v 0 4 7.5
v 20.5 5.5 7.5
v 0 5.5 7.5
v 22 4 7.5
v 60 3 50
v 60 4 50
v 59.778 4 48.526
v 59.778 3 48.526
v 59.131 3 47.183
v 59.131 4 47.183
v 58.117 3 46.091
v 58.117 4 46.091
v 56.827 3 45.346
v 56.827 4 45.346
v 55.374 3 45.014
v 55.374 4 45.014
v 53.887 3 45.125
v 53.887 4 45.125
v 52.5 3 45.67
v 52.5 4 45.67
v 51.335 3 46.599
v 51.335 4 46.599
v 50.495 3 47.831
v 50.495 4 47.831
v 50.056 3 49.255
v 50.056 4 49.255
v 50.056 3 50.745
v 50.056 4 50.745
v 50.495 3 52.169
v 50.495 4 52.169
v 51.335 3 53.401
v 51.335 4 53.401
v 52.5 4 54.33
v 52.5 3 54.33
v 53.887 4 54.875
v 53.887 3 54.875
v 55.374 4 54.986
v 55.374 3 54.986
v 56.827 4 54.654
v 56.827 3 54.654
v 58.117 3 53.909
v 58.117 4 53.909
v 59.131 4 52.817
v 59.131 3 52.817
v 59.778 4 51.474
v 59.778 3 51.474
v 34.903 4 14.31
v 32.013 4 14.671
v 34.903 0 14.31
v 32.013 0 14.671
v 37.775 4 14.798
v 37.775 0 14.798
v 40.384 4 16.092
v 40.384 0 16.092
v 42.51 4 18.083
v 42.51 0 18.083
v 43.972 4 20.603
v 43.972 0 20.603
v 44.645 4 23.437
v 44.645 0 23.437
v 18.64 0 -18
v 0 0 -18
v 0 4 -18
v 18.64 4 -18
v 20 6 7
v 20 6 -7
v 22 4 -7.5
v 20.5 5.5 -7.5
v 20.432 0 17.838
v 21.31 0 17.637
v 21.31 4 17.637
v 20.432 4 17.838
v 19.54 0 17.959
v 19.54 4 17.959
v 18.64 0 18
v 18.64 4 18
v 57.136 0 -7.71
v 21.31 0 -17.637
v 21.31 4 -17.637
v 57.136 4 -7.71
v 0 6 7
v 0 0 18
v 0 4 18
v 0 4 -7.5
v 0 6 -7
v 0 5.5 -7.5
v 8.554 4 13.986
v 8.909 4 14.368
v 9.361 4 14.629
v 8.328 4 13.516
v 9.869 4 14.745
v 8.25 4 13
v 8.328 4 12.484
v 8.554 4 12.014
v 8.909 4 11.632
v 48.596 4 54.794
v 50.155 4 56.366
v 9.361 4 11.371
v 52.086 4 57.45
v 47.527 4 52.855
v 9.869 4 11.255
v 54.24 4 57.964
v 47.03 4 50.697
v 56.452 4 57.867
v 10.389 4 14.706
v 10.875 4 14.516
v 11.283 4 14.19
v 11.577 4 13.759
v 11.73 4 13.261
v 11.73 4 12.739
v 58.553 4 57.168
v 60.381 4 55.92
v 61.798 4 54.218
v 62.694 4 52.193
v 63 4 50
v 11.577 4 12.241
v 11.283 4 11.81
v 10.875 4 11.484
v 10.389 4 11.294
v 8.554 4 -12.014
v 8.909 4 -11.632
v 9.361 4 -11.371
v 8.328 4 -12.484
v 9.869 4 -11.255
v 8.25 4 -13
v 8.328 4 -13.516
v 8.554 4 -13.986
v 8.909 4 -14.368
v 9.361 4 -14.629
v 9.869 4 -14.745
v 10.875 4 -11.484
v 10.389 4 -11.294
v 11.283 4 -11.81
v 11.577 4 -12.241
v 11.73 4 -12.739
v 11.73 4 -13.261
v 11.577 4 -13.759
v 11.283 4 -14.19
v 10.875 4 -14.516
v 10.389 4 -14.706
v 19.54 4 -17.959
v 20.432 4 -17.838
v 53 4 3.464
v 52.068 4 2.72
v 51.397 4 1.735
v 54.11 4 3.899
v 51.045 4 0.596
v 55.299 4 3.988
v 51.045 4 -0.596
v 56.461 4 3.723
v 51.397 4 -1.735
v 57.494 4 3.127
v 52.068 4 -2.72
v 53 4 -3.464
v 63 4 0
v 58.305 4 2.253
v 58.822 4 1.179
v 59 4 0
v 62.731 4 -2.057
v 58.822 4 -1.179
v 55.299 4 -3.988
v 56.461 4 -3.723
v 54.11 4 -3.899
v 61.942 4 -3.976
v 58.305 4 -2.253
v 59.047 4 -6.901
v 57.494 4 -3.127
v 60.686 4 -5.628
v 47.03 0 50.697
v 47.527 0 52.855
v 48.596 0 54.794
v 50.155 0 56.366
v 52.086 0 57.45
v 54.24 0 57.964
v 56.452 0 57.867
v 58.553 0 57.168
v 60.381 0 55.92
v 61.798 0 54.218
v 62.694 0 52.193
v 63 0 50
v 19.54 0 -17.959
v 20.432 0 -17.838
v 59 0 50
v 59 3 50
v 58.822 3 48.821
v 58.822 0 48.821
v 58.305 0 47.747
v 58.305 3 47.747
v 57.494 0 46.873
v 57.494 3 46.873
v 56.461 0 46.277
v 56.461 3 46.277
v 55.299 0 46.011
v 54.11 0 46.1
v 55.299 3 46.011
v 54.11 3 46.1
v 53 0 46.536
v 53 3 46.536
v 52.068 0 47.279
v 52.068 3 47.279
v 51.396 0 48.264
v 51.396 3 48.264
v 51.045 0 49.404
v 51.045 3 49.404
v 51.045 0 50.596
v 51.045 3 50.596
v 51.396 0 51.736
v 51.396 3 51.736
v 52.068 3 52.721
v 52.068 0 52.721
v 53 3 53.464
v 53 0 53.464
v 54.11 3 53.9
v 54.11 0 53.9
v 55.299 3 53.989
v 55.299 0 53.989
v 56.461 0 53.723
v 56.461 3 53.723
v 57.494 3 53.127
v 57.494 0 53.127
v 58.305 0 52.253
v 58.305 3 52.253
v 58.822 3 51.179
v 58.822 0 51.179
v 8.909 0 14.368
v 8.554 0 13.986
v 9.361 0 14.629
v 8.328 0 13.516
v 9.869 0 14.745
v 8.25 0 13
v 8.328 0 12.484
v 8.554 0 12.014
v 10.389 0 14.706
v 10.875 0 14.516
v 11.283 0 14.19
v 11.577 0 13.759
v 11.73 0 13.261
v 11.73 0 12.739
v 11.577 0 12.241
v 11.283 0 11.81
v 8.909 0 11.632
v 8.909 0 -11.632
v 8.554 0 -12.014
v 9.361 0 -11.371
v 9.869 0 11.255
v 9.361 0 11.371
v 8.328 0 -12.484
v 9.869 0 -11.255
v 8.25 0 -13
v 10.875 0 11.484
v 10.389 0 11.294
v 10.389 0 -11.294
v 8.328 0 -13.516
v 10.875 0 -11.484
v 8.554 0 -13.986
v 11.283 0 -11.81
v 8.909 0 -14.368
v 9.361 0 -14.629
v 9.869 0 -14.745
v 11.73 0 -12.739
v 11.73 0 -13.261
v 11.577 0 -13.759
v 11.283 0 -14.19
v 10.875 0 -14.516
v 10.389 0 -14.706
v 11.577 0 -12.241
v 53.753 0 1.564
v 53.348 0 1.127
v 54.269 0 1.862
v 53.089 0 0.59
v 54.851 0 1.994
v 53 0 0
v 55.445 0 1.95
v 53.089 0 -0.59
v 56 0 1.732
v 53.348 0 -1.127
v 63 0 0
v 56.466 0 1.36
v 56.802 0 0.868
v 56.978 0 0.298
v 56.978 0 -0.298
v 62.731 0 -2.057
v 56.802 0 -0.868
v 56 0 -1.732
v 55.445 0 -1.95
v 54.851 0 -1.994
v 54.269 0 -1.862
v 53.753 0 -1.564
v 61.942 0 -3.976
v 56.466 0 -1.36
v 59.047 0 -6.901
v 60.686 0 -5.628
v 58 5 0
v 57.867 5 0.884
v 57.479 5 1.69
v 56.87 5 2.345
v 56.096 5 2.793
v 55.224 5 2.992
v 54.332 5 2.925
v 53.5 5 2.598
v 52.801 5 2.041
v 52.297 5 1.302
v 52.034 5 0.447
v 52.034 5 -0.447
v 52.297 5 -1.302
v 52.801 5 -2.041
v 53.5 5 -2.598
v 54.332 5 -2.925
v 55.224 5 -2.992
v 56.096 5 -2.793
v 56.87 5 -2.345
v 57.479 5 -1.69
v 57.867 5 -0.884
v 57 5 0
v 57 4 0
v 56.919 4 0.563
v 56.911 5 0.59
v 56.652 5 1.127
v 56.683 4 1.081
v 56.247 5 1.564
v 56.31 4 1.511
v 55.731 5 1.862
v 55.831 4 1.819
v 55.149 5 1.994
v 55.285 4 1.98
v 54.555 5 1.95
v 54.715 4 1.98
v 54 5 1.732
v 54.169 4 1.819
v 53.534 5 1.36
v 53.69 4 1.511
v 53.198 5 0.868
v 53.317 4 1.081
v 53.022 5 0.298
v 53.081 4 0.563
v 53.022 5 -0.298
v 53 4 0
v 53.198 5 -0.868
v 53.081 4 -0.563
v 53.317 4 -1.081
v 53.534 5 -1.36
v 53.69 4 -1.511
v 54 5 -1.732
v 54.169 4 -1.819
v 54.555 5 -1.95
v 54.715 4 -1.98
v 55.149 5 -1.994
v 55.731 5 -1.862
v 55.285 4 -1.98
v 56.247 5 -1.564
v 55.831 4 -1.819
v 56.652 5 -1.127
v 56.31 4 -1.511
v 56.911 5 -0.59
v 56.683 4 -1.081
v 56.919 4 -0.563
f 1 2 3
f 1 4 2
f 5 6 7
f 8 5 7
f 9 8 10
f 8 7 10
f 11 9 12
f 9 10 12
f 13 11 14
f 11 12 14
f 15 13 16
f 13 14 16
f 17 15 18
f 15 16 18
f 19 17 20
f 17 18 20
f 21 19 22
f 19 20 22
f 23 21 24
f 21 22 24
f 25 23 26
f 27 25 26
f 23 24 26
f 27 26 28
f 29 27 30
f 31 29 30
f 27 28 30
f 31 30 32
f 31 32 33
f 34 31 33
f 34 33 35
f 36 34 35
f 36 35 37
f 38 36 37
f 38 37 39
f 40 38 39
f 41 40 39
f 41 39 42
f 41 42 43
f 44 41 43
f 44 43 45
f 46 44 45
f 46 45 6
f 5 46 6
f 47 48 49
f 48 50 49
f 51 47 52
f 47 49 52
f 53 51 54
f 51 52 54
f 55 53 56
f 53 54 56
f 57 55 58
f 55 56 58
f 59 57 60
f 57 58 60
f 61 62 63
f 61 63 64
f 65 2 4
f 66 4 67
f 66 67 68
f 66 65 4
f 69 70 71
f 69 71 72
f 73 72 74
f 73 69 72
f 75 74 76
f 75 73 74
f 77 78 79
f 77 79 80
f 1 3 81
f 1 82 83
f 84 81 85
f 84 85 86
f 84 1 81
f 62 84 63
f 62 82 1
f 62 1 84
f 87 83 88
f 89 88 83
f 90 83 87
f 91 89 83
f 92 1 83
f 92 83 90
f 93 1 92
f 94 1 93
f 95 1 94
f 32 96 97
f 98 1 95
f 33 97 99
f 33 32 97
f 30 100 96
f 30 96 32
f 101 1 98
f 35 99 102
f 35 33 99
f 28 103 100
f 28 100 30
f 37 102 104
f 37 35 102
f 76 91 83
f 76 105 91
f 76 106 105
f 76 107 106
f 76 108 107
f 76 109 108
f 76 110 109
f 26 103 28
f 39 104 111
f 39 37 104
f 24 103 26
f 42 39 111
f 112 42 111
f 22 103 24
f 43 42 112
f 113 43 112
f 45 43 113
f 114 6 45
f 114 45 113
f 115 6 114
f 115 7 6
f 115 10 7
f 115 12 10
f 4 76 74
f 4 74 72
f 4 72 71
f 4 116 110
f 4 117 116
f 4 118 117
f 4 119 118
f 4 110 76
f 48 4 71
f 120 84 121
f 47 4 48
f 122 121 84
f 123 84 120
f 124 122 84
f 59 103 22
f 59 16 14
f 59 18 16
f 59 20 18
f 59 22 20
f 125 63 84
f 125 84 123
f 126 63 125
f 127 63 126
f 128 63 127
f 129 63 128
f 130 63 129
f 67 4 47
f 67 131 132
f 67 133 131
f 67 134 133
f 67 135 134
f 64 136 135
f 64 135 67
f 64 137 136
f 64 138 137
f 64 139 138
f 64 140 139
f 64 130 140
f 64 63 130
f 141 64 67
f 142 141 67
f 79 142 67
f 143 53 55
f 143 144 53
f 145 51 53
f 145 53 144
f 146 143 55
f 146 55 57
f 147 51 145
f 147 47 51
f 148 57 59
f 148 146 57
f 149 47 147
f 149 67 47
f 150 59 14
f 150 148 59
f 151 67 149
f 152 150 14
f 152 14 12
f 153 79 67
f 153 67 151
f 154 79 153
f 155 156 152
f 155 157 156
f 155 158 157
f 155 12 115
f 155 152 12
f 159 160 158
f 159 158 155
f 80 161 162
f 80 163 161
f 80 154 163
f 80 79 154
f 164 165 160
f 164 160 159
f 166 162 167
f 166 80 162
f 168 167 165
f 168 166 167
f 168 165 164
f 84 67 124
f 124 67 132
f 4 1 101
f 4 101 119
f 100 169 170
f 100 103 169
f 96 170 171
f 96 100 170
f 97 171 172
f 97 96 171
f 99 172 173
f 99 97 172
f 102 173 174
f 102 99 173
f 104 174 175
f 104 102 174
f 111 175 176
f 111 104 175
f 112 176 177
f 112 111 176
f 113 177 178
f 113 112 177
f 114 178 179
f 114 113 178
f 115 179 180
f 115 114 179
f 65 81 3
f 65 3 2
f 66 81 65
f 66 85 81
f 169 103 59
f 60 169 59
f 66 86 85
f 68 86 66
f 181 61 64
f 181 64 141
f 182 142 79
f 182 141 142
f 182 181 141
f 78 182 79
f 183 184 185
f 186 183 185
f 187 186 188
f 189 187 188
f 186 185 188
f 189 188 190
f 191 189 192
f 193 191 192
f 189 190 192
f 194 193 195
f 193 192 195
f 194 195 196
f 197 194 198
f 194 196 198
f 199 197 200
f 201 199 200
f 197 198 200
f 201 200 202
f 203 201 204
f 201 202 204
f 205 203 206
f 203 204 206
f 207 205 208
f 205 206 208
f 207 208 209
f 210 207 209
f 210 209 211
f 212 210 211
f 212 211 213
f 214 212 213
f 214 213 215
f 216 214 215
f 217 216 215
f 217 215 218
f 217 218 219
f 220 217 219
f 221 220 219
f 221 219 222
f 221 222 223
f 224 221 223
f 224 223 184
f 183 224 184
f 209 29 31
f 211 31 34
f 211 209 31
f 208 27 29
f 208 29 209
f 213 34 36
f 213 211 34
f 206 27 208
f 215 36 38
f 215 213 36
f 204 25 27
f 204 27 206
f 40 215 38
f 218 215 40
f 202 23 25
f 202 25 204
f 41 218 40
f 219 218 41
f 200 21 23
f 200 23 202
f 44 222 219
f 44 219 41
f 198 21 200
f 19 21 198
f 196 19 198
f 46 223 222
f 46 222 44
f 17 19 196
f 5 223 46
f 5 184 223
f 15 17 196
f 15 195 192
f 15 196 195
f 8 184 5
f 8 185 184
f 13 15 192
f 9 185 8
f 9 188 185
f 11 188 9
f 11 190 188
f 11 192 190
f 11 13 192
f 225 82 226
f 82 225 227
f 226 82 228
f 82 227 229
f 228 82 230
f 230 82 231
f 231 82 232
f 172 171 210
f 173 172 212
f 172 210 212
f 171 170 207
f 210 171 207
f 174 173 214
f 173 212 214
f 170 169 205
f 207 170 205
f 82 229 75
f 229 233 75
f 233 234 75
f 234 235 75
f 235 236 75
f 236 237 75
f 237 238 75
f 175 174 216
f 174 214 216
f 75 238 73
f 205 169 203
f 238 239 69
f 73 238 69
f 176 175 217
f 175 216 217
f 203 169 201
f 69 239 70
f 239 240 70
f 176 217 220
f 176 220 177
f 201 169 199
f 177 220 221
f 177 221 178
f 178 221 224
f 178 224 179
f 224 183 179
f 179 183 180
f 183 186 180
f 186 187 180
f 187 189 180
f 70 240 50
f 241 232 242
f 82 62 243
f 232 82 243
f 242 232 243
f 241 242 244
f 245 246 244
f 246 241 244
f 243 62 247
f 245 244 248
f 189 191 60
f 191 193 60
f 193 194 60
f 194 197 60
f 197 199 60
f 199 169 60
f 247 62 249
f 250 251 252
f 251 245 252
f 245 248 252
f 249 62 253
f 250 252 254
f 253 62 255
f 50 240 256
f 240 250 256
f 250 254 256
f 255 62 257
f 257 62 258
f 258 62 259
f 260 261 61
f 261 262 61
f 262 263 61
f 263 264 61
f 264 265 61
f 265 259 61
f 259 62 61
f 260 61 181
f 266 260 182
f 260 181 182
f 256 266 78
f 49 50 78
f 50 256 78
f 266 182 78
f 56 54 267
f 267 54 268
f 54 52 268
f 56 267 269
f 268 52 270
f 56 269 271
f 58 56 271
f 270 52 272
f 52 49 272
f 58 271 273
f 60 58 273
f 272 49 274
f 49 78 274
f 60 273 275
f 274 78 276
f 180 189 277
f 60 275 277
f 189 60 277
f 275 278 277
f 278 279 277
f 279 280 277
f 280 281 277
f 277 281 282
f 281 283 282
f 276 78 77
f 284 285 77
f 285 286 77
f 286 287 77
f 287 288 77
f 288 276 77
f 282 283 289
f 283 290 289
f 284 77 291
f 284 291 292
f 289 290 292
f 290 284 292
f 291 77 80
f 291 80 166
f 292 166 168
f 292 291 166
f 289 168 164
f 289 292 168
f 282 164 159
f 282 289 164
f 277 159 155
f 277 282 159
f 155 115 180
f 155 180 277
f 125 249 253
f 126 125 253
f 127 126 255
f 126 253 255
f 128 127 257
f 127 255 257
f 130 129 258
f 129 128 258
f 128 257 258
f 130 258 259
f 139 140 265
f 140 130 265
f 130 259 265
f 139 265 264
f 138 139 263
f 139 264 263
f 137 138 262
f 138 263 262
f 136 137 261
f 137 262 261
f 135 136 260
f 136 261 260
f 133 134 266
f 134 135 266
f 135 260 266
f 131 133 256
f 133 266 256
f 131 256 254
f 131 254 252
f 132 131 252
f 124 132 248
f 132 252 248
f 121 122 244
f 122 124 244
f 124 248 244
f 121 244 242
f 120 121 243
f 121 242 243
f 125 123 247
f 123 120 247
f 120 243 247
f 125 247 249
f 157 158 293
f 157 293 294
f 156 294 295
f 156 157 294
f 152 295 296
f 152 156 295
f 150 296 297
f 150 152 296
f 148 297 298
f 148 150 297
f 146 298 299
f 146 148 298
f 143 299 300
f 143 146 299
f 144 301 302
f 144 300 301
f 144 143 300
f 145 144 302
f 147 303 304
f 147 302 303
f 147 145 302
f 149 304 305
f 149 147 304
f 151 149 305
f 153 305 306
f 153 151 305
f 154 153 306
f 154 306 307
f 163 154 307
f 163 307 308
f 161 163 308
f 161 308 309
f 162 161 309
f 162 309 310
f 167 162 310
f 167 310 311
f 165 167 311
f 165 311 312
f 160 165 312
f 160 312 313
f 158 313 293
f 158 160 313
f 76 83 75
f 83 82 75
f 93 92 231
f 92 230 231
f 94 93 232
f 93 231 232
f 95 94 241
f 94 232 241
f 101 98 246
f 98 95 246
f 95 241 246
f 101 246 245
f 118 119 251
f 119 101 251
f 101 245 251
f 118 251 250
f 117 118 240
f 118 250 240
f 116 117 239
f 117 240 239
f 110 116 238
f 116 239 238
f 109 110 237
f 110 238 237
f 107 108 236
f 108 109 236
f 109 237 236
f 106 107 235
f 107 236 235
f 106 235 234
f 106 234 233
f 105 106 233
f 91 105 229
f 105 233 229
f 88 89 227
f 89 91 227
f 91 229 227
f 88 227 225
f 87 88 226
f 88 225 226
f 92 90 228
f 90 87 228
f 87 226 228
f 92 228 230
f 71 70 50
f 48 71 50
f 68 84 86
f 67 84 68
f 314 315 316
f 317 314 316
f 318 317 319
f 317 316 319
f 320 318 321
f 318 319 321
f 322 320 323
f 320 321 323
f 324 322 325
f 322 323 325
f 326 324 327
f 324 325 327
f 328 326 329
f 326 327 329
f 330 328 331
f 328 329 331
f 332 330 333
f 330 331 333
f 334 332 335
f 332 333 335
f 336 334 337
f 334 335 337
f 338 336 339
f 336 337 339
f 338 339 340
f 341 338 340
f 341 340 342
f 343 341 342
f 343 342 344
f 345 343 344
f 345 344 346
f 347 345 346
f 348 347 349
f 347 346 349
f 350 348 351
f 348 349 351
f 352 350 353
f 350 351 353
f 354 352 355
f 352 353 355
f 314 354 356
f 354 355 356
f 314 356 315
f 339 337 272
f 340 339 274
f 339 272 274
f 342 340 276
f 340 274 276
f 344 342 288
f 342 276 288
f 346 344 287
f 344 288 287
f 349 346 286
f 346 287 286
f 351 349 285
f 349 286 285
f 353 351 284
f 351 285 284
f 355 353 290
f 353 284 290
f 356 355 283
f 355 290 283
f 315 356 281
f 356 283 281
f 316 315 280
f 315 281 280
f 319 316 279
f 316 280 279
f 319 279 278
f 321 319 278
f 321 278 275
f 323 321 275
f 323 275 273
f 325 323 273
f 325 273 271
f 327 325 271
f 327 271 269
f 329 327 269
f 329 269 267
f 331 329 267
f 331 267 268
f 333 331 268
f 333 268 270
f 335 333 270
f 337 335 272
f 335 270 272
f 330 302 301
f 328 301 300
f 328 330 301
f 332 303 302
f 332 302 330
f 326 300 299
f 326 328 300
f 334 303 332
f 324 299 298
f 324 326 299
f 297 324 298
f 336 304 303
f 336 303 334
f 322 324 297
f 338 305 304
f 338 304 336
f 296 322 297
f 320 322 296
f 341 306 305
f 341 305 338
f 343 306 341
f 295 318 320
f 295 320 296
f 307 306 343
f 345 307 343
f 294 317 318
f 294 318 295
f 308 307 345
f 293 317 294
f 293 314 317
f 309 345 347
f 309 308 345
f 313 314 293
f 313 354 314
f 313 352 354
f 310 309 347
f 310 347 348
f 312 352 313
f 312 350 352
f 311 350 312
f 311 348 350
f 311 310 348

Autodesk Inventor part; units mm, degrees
ref_plane "YZ Plane" through (0, 0, 0) normal (1, 0, 0) x (0, 1, 0)
ref_plane "XZ Plane" through (0, 0, 0) normal (0, 1, 0) x (-1, 0, 0)
ref_plane "XY Plane" through (0, 0, 0) normal (0, 0, 1) x (1, 0, 0)
sketch "Эскиз1" plane through (0, 0, 0) normal (0, 1, 0) x (-1, 0, 0)
  line L0 (0, 18) -> (0, -18)
  arc A0 (-57.1363, 7.7095) -> (-57.1363, -7.7095) centre (-55, 0) ccw
  line L1 (0, 0) -> (-6.25, 0) construction
  line L2 (0, 18) -> (-18.6401, 18)
  line L3 (-21.3105, 17.6369) -> (-57.1363, 7.7095)
  line L4 (0, -18) -> (-18.6401, -18)
  line L5 (-21.3105, -17.6369) -> (-57.1363, -7.7095)
  circle A1 centre (-55, 0) radius 2
  arc A2 (-18.6401, 18) -> (-21.3105, 17.6369) centre (-18.6401, 8) ccw
  arc A3 (-21.3105, -17.6369) -> (-18.6401, -18) centre (-18.6401, -8) ccw
  circle A4 centre (-10, -13) radius 1.75
  circle A5 centre (-10, 13) radius 1.75
  line L6 (-10, 13) -> (-10, -13) construction
  point P0 (-20, 18)
  dimension "d0" = 16
  dimension "d1" = 36
  dimension "d2" = 55
  dimension "d3" = 20
  dimension "d4" = 4
  dimension "d5" = 10
  dimension "d18" = 3.5
  dimension "d19" = 13
  dimension "d20" = 10
extrude "Выдавливание1" add sketch "Эскиз1" along normal blind 4
sketch "Эскиз2" plane through (0, 4, 0) normal (0, 1, 0) x (1, 0, 0)
  line L0 (0, 0) -> (14.985, 0) construction
  line L1 (0, 7.5) -> (22, 7.5)
  line L2 (22, 7.5) -> (22, -7.5)
  line L3 (22, -7.5) -> (0, -7.5)
  line L4 (0, -7.5) -> (0, 7.5)
  line L5 (0, 18) -> (0, -18) projected
  dimension "d8" = 15
  dimension "d9" = 22
extrude "Выдавливание2" add sketch "Эскиз2" along normal blind 2
chamfer "Фаска1" distance 2 angle 45 1 edges at (22, 6, 0)
chamfer "Фаска2" distance 0.5 angle 45 2 edges at (10.0002, 6, 7.5) (10.0003, 6, -7.5)
sketch "Эскиз4" plane through (0, 4, 0) normal (0, 1, 0) x (1, 0, 0)
  arc A0 (47.0304, -50.6972) -> (63, -50) centre (55, -50) ccw
  line L0 (63, -50) -> (63, 0)
  arc A1 (57.1363, -7.7095) -> (57.1363, 7.7095) centre (55, 0) ccw projected
  line L1 (47.0304, -50.6972) -> (43.5977, -11.461)
  line L2 (57.1363, -7.7095) -> (21.3105, -17.6369) projected
  circle A2 centre (55, -50) radius 4
  point P0 (0, 0)
  dimension "d21" = 16
  dimension "d22" = 50
  dimension "d23" = 55
  dimension "d24" = 5
  dimension "d34" = 8
  dimension "d35" = 55
extrude "Выдавливание3" add sketch "Эскиз4" against normal up to surface (4 mm away)
fillet "Сопряжение1" radius 10 1 edges at (43.5977, 2, 11.461)
sketch "Эскиз5" plane through (0, 4, 0) normal (0, 1, 0) x (1, 0, 0)
  circle A0 centre (55, 0) radius 2 projected
  circle A1 centre (55, 0) radius 3
  point P0 (0, 0)
  dimension "d28" = 1
extrude "Выдавливание4" add sketch "Эскиз5" along normal blind 1
chamfer "Фаска3" distance 1 angle 45 1 edges at (52, 4, 0)
sketch "Эскиз7" plane through (0, 4, 0) normal (0, 1, 0) x (1, 0, 0)
  circle A0 centre (55, -50) radius 4 projected
  circle A1 centre (55, -50) radius 5
  point P0 (0, 0)
  dimension "d36" = 10
extrude "Выдавливание5" cut sketch "Эскиз7" against normal blind 1
properties part number "04-06-Рычаг нижний"
